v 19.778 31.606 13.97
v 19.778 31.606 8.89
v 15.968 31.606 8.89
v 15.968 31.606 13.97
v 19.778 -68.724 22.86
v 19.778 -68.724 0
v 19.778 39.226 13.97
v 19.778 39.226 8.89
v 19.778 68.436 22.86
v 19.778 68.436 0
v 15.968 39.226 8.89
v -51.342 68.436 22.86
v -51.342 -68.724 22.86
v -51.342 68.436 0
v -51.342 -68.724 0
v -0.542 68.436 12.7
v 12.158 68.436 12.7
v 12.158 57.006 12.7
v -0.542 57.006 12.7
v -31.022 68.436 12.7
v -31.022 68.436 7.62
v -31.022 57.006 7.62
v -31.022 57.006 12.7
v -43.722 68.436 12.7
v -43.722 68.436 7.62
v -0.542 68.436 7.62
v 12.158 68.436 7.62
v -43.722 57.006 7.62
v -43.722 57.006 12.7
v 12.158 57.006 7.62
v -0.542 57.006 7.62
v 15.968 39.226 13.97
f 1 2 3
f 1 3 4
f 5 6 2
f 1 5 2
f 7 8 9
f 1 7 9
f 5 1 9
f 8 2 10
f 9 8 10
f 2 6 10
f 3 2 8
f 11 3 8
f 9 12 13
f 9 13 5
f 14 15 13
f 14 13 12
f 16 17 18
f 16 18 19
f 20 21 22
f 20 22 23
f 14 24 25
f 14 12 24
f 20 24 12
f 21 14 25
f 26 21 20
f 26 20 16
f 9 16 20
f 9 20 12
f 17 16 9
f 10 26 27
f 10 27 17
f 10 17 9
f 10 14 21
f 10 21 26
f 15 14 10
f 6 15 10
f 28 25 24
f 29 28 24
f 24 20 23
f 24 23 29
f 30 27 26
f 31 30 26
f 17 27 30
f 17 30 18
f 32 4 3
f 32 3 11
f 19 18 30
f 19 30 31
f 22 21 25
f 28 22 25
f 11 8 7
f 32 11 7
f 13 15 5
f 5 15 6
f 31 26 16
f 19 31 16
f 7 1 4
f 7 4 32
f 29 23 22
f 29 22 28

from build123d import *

# Parameters (mm, degrees)
F0_W     = 71.12
F0_H     = 137.16
F1_DEPTH = 22.86
F2_W     = 12.7
F2_H     = 5.08
F3_DEPTH = 11.43
F4_W     = 7.62
F4_H     = 5.08
F5_DEPTH = 3.81


with BuildPart() as f1:
    # F0 (on Top) → F1 (new body)
    with BuildSketch(Plane.XY):
        with Locations((-15.782022, -0.143904)):
            Rectangle(F0_W, F0_H)
    extrude(amount=F1_DEPTH)

    # F2 (on face) → F3 (cut)
    with BuildSketch(Plane(origin=(0, 68.436096, 0), x_dir=(-1, 0, 0), z_dir=(0, 1, 0))):
        with Locations((-5.807978, 10.16)):
            Rectangle(F2_W, F2_H)
        with Locations((37.372022, 10.16)):
            Rectangle(F2_W, F2_H)
    extrude(amount=-F3_DEPTH, mode=Mode.SUBTRACT)

    # F4 (on face) → F5 (cut)
    with BuildSketch(Plane.YZ.offset(19.777978)):
        with Locations((35.416096, 11.43)):
            Rectangle(F4_W, F4_H)
    extrude(amount=-F5_DEPTH, mode=Mode.SUBTRACT)


solid = f1.part
